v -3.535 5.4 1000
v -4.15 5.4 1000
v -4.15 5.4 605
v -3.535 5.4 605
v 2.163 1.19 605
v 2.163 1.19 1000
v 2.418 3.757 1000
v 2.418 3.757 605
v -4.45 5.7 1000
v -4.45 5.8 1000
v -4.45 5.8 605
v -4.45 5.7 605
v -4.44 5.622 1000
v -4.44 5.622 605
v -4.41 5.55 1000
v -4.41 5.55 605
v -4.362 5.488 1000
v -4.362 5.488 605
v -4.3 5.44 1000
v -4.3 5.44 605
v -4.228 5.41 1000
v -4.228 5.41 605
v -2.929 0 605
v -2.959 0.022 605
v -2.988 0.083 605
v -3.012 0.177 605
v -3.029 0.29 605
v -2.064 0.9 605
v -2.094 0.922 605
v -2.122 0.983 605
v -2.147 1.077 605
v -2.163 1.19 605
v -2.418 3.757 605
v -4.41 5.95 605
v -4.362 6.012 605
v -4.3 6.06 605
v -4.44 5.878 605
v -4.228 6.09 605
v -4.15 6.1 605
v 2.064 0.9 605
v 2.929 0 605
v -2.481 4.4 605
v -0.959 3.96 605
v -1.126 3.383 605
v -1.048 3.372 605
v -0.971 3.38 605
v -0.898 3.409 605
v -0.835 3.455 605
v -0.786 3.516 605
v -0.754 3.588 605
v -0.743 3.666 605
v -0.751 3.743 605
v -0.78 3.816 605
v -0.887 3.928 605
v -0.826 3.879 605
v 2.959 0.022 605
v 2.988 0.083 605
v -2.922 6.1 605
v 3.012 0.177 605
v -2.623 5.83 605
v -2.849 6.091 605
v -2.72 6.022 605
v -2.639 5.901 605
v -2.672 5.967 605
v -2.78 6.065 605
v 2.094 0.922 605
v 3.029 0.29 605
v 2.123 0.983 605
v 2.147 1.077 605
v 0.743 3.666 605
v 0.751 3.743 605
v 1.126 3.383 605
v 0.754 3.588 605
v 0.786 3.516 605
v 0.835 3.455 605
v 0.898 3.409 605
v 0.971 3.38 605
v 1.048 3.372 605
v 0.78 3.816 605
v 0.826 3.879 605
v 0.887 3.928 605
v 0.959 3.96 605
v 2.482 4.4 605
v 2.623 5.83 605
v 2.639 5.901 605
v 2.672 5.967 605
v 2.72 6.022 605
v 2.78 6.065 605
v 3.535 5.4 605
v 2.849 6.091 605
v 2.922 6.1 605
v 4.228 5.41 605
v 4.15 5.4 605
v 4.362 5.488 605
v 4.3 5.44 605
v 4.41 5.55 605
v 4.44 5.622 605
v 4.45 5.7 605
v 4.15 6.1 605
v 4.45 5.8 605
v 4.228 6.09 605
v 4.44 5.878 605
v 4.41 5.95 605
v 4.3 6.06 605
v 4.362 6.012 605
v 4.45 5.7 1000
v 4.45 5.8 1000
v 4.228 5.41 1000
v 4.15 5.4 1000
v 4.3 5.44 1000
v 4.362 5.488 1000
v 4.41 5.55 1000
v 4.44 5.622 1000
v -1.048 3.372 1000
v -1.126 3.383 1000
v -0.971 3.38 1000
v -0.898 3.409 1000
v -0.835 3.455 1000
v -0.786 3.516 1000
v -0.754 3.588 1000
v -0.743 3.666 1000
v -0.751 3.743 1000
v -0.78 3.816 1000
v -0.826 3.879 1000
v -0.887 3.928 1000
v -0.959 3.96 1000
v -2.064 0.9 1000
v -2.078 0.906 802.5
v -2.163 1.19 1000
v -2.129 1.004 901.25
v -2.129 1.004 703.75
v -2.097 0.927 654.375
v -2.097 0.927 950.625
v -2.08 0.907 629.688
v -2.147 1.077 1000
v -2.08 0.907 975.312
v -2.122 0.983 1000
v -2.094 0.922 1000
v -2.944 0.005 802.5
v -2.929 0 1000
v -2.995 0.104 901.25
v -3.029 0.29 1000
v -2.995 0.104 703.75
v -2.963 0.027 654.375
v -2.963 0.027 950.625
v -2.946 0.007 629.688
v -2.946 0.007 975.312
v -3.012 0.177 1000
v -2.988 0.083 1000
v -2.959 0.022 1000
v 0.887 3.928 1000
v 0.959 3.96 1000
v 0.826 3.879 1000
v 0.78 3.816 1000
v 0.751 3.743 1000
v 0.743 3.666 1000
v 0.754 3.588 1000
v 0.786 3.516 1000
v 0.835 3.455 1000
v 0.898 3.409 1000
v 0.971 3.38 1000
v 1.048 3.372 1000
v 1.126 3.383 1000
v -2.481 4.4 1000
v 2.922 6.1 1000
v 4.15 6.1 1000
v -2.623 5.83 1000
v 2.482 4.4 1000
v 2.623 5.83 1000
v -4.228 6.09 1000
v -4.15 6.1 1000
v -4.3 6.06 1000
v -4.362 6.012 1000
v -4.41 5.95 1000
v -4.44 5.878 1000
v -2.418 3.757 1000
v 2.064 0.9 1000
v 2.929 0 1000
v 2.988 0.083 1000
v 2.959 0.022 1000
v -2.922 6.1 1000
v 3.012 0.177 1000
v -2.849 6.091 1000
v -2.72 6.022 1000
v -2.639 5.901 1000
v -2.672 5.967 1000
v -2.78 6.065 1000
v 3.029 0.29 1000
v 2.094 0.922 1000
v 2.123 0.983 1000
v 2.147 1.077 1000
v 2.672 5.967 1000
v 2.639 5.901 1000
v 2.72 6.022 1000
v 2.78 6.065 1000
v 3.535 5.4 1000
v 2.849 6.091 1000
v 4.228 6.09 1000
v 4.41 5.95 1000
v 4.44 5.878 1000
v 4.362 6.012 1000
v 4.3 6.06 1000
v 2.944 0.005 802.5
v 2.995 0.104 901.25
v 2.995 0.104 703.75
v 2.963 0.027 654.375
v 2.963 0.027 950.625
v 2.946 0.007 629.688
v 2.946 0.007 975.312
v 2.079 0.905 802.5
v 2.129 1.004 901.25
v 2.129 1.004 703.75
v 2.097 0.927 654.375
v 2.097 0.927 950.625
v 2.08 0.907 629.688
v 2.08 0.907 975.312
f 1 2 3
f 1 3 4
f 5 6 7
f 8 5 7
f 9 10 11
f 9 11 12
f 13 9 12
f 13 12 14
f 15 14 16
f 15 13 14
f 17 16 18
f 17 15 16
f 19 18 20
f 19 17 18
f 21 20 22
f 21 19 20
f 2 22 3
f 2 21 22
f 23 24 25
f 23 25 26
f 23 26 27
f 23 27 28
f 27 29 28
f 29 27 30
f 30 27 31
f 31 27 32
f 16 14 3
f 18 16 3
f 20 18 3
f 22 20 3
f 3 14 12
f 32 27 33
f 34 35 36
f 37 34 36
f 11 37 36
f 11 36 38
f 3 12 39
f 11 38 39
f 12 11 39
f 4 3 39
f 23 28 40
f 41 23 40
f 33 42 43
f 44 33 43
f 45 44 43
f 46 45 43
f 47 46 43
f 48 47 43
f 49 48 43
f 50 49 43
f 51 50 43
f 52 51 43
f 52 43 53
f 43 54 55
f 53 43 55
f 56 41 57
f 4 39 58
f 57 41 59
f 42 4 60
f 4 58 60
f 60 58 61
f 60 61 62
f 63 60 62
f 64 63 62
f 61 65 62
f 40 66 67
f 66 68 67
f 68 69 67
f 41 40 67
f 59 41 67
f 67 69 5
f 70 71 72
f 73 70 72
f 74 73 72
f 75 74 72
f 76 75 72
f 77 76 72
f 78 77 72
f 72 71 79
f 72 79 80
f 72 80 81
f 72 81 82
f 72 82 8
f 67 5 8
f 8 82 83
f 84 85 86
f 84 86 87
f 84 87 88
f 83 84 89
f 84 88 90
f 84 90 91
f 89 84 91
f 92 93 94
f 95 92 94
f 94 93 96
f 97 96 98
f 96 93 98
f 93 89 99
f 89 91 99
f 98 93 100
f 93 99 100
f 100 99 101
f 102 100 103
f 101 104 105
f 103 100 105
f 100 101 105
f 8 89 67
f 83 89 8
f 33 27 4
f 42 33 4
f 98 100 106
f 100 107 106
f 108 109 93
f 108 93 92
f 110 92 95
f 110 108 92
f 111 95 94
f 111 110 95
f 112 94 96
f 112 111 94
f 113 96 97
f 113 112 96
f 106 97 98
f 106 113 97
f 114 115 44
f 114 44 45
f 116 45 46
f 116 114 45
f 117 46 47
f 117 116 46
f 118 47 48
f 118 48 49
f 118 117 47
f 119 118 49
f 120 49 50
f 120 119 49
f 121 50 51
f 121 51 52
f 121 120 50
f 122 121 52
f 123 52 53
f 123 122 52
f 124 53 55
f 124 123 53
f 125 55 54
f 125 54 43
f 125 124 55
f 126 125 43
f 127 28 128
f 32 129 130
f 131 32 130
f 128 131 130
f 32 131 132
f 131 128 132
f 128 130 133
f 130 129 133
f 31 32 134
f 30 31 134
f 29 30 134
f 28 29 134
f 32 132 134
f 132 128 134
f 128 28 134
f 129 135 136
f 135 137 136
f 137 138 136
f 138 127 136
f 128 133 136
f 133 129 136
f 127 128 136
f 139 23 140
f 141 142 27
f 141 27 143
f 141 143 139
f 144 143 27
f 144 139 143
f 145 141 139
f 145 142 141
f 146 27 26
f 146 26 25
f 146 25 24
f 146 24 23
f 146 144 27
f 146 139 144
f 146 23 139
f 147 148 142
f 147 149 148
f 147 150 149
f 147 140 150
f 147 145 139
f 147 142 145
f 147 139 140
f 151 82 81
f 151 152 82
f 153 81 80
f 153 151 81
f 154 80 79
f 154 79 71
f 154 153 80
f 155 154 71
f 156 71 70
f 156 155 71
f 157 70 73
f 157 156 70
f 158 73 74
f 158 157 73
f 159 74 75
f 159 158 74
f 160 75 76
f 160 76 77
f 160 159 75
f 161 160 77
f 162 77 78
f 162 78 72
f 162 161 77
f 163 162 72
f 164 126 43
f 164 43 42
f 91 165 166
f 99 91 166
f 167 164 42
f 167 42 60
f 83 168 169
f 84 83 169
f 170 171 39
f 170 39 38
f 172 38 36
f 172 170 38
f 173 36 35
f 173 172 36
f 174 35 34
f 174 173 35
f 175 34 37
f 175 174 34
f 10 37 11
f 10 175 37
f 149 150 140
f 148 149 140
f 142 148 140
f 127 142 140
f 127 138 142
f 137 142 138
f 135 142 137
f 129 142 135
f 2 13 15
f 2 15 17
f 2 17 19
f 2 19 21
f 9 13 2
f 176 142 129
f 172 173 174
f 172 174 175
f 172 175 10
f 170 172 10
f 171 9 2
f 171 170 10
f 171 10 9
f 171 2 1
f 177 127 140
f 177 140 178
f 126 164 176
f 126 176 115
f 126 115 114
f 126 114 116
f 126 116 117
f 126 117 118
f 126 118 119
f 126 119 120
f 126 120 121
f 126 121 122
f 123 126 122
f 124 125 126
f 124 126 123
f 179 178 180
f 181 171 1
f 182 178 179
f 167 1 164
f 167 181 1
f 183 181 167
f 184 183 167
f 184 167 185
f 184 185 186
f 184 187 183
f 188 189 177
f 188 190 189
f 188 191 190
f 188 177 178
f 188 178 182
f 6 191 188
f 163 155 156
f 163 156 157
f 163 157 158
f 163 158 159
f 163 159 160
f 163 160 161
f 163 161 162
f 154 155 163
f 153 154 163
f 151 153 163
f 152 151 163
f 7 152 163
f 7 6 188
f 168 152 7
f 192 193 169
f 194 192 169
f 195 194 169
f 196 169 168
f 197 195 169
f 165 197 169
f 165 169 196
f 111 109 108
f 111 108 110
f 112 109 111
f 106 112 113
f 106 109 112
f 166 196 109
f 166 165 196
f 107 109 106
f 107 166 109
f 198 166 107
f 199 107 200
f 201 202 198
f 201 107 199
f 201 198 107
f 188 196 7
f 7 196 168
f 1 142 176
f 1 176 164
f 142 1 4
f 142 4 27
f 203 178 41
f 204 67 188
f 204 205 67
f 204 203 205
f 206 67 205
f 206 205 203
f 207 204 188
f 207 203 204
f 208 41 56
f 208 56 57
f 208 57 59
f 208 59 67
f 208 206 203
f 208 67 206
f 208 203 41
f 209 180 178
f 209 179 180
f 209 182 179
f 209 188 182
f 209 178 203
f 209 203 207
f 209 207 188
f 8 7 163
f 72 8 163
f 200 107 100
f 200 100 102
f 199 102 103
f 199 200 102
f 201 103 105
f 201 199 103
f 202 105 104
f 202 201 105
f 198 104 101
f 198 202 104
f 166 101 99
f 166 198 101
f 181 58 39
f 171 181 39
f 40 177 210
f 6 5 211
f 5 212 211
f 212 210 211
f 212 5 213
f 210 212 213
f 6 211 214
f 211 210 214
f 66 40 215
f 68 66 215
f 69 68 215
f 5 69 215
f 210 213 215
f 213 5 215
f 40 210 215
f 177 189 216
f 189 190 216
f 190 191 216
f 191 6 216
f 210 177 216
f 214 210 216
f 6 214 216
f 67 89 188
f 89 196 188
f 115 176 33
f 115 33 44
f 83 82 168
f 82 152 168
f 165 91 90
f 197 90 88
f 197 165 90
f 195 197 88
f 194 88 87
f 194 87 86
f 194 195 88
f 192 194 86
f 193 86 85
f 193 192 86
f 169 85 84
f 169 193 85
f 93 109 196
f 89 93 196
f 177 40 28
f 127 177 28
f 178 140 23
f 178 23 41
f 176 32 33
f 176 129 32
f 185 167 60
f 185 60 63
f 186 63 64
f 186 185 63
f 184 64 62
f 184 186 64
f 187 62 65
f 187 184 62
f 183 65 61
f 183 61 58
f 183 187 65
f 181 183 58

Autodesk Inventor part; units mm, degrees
ref_plane "YZ Plane" through (0, 0, 0) normal (1, 0, 0) x (0, 1, 0)
ref_plane "XZ Plane" through (0, 0, 0) normal (0, 1, 0) x (-1, 0, 0)
ref_plane "РабПлоскость5" through (-2.9292, 0, 1000) normal (0, 0, 1) x (1, 0, 0)
sketch "Эскиз1" plane through (-2.9292, 0, 1000) normal (0, 0, 1) x (1, 0, 0)
  ellipse E0 centre (5.8827, 0.3219) end of major axis (5.857, 0.0001) minor radius 0.0779 (5.8585, 0) -> (5.958, 0.2901) ccw
  arc A0 (1.8034, 3.3833) -> (1.97, 3.9597) centre (1.8867, 3.6715) ccw
  arc A1 (3.8884, 3.9597) -> (4.0551, 3.3833) centre (3.9718, 3.6715) ccw
  line L0 (5.347, 3.757) -> (4.0551, 3.3833)
  line L1 (5.0926, 1.1901) -> (5.347, 3.757)
  ellipse E1 centre (0.8413, 1.2219) end of major axis (0.8156, 1.5437) minor radius 0.0779 (0.7659, 1.1901) -> (0.8654, 0.9) ccw
  line L2 (4.993, 0.9) -> (0.8654, 0.9)
  ellipse E2 centre (5.0172, 1.2219) end of major axis (5.0429, 1.5437) minor radius 0.0779 (4.993, 0.9) -> (5.0926, 1.1901) ccw
  line L3 (0.7659, 1.1901) -> (0.5115, 3.757)
  line L4 (1.97, 3.9597) -> (0.4478, 4.4)
  line L5 (3.8884, 3.9597) -> (5.4107, 4.4)
  line L6 (5.4107, 4.4) -> (5.5524, 5.8296)
  arc A2 (5.851, 6.1) -> (5.5524, 5.8296) centre (5.851, 5.8) ccw
  line L7 (5.851, 6.1) -> (7.0792, 6.1)
  arc A3 (7.3792, 5.8) -> (7.0792, 6.1) centre (7.0792, 5.8) ccw
  arc A4 (7.0792, 5.4) -> (7.3792, 5.7) centre (7.0792, 5.7) ccw
  line L8 (7.0792, 5.4) -> (6.4645, 5.4)
  line L9 (-0.606, 5.4) -> (-0.0995, 0.2901)
  line L10 (-1.2208, 5.4) -> (-0.606, 5.4)
  arc A5 (-1.5208, 5.7) -> (-1.2208, 5.4) centre (-1.2208, 5.7) ccw
  line L11 (-1.5208, 5.8) -> (-1.5208, 5.7)
  arc A6 (-1.2208, 6.1) -> (-1.5208, 5.8) centre (-1.2208, 5.8) ccw
  line L12 (0.0075, 6.1) -> (-1.2208, 6.1)
  arc A7 (0.3061, 5.8296) -> (0.0075, 6.1) centre (0.0075, 5.8) ccw
  line L13 (0.4478, 4.4) -> (0.3061, 5.8296)
  ellipse E3 centre (-0.0242, 0.3219) end of major axis (0.0015, 0.0001) minor radius 0.0779 (-0.0995, 0.2901) -> (0, 0) ccw
  line L14 (0, 0) -> (5.8585, 0)
  line L15 (6.4645, 5.4) -> (5.958, 0.2901)
  line L16 (7.3792, 5.8) -> (7.3792, 5.7)
  line L17 (0.5115, 3.757) -> (1.8034, 3.3833)
  point P0 (2.9292, 0)
extrude "Выдавливание1" add sketch "Эскиз1" against normal blind 395
properties part number "Uplotnitel-pazovyy395_-paz-6"
